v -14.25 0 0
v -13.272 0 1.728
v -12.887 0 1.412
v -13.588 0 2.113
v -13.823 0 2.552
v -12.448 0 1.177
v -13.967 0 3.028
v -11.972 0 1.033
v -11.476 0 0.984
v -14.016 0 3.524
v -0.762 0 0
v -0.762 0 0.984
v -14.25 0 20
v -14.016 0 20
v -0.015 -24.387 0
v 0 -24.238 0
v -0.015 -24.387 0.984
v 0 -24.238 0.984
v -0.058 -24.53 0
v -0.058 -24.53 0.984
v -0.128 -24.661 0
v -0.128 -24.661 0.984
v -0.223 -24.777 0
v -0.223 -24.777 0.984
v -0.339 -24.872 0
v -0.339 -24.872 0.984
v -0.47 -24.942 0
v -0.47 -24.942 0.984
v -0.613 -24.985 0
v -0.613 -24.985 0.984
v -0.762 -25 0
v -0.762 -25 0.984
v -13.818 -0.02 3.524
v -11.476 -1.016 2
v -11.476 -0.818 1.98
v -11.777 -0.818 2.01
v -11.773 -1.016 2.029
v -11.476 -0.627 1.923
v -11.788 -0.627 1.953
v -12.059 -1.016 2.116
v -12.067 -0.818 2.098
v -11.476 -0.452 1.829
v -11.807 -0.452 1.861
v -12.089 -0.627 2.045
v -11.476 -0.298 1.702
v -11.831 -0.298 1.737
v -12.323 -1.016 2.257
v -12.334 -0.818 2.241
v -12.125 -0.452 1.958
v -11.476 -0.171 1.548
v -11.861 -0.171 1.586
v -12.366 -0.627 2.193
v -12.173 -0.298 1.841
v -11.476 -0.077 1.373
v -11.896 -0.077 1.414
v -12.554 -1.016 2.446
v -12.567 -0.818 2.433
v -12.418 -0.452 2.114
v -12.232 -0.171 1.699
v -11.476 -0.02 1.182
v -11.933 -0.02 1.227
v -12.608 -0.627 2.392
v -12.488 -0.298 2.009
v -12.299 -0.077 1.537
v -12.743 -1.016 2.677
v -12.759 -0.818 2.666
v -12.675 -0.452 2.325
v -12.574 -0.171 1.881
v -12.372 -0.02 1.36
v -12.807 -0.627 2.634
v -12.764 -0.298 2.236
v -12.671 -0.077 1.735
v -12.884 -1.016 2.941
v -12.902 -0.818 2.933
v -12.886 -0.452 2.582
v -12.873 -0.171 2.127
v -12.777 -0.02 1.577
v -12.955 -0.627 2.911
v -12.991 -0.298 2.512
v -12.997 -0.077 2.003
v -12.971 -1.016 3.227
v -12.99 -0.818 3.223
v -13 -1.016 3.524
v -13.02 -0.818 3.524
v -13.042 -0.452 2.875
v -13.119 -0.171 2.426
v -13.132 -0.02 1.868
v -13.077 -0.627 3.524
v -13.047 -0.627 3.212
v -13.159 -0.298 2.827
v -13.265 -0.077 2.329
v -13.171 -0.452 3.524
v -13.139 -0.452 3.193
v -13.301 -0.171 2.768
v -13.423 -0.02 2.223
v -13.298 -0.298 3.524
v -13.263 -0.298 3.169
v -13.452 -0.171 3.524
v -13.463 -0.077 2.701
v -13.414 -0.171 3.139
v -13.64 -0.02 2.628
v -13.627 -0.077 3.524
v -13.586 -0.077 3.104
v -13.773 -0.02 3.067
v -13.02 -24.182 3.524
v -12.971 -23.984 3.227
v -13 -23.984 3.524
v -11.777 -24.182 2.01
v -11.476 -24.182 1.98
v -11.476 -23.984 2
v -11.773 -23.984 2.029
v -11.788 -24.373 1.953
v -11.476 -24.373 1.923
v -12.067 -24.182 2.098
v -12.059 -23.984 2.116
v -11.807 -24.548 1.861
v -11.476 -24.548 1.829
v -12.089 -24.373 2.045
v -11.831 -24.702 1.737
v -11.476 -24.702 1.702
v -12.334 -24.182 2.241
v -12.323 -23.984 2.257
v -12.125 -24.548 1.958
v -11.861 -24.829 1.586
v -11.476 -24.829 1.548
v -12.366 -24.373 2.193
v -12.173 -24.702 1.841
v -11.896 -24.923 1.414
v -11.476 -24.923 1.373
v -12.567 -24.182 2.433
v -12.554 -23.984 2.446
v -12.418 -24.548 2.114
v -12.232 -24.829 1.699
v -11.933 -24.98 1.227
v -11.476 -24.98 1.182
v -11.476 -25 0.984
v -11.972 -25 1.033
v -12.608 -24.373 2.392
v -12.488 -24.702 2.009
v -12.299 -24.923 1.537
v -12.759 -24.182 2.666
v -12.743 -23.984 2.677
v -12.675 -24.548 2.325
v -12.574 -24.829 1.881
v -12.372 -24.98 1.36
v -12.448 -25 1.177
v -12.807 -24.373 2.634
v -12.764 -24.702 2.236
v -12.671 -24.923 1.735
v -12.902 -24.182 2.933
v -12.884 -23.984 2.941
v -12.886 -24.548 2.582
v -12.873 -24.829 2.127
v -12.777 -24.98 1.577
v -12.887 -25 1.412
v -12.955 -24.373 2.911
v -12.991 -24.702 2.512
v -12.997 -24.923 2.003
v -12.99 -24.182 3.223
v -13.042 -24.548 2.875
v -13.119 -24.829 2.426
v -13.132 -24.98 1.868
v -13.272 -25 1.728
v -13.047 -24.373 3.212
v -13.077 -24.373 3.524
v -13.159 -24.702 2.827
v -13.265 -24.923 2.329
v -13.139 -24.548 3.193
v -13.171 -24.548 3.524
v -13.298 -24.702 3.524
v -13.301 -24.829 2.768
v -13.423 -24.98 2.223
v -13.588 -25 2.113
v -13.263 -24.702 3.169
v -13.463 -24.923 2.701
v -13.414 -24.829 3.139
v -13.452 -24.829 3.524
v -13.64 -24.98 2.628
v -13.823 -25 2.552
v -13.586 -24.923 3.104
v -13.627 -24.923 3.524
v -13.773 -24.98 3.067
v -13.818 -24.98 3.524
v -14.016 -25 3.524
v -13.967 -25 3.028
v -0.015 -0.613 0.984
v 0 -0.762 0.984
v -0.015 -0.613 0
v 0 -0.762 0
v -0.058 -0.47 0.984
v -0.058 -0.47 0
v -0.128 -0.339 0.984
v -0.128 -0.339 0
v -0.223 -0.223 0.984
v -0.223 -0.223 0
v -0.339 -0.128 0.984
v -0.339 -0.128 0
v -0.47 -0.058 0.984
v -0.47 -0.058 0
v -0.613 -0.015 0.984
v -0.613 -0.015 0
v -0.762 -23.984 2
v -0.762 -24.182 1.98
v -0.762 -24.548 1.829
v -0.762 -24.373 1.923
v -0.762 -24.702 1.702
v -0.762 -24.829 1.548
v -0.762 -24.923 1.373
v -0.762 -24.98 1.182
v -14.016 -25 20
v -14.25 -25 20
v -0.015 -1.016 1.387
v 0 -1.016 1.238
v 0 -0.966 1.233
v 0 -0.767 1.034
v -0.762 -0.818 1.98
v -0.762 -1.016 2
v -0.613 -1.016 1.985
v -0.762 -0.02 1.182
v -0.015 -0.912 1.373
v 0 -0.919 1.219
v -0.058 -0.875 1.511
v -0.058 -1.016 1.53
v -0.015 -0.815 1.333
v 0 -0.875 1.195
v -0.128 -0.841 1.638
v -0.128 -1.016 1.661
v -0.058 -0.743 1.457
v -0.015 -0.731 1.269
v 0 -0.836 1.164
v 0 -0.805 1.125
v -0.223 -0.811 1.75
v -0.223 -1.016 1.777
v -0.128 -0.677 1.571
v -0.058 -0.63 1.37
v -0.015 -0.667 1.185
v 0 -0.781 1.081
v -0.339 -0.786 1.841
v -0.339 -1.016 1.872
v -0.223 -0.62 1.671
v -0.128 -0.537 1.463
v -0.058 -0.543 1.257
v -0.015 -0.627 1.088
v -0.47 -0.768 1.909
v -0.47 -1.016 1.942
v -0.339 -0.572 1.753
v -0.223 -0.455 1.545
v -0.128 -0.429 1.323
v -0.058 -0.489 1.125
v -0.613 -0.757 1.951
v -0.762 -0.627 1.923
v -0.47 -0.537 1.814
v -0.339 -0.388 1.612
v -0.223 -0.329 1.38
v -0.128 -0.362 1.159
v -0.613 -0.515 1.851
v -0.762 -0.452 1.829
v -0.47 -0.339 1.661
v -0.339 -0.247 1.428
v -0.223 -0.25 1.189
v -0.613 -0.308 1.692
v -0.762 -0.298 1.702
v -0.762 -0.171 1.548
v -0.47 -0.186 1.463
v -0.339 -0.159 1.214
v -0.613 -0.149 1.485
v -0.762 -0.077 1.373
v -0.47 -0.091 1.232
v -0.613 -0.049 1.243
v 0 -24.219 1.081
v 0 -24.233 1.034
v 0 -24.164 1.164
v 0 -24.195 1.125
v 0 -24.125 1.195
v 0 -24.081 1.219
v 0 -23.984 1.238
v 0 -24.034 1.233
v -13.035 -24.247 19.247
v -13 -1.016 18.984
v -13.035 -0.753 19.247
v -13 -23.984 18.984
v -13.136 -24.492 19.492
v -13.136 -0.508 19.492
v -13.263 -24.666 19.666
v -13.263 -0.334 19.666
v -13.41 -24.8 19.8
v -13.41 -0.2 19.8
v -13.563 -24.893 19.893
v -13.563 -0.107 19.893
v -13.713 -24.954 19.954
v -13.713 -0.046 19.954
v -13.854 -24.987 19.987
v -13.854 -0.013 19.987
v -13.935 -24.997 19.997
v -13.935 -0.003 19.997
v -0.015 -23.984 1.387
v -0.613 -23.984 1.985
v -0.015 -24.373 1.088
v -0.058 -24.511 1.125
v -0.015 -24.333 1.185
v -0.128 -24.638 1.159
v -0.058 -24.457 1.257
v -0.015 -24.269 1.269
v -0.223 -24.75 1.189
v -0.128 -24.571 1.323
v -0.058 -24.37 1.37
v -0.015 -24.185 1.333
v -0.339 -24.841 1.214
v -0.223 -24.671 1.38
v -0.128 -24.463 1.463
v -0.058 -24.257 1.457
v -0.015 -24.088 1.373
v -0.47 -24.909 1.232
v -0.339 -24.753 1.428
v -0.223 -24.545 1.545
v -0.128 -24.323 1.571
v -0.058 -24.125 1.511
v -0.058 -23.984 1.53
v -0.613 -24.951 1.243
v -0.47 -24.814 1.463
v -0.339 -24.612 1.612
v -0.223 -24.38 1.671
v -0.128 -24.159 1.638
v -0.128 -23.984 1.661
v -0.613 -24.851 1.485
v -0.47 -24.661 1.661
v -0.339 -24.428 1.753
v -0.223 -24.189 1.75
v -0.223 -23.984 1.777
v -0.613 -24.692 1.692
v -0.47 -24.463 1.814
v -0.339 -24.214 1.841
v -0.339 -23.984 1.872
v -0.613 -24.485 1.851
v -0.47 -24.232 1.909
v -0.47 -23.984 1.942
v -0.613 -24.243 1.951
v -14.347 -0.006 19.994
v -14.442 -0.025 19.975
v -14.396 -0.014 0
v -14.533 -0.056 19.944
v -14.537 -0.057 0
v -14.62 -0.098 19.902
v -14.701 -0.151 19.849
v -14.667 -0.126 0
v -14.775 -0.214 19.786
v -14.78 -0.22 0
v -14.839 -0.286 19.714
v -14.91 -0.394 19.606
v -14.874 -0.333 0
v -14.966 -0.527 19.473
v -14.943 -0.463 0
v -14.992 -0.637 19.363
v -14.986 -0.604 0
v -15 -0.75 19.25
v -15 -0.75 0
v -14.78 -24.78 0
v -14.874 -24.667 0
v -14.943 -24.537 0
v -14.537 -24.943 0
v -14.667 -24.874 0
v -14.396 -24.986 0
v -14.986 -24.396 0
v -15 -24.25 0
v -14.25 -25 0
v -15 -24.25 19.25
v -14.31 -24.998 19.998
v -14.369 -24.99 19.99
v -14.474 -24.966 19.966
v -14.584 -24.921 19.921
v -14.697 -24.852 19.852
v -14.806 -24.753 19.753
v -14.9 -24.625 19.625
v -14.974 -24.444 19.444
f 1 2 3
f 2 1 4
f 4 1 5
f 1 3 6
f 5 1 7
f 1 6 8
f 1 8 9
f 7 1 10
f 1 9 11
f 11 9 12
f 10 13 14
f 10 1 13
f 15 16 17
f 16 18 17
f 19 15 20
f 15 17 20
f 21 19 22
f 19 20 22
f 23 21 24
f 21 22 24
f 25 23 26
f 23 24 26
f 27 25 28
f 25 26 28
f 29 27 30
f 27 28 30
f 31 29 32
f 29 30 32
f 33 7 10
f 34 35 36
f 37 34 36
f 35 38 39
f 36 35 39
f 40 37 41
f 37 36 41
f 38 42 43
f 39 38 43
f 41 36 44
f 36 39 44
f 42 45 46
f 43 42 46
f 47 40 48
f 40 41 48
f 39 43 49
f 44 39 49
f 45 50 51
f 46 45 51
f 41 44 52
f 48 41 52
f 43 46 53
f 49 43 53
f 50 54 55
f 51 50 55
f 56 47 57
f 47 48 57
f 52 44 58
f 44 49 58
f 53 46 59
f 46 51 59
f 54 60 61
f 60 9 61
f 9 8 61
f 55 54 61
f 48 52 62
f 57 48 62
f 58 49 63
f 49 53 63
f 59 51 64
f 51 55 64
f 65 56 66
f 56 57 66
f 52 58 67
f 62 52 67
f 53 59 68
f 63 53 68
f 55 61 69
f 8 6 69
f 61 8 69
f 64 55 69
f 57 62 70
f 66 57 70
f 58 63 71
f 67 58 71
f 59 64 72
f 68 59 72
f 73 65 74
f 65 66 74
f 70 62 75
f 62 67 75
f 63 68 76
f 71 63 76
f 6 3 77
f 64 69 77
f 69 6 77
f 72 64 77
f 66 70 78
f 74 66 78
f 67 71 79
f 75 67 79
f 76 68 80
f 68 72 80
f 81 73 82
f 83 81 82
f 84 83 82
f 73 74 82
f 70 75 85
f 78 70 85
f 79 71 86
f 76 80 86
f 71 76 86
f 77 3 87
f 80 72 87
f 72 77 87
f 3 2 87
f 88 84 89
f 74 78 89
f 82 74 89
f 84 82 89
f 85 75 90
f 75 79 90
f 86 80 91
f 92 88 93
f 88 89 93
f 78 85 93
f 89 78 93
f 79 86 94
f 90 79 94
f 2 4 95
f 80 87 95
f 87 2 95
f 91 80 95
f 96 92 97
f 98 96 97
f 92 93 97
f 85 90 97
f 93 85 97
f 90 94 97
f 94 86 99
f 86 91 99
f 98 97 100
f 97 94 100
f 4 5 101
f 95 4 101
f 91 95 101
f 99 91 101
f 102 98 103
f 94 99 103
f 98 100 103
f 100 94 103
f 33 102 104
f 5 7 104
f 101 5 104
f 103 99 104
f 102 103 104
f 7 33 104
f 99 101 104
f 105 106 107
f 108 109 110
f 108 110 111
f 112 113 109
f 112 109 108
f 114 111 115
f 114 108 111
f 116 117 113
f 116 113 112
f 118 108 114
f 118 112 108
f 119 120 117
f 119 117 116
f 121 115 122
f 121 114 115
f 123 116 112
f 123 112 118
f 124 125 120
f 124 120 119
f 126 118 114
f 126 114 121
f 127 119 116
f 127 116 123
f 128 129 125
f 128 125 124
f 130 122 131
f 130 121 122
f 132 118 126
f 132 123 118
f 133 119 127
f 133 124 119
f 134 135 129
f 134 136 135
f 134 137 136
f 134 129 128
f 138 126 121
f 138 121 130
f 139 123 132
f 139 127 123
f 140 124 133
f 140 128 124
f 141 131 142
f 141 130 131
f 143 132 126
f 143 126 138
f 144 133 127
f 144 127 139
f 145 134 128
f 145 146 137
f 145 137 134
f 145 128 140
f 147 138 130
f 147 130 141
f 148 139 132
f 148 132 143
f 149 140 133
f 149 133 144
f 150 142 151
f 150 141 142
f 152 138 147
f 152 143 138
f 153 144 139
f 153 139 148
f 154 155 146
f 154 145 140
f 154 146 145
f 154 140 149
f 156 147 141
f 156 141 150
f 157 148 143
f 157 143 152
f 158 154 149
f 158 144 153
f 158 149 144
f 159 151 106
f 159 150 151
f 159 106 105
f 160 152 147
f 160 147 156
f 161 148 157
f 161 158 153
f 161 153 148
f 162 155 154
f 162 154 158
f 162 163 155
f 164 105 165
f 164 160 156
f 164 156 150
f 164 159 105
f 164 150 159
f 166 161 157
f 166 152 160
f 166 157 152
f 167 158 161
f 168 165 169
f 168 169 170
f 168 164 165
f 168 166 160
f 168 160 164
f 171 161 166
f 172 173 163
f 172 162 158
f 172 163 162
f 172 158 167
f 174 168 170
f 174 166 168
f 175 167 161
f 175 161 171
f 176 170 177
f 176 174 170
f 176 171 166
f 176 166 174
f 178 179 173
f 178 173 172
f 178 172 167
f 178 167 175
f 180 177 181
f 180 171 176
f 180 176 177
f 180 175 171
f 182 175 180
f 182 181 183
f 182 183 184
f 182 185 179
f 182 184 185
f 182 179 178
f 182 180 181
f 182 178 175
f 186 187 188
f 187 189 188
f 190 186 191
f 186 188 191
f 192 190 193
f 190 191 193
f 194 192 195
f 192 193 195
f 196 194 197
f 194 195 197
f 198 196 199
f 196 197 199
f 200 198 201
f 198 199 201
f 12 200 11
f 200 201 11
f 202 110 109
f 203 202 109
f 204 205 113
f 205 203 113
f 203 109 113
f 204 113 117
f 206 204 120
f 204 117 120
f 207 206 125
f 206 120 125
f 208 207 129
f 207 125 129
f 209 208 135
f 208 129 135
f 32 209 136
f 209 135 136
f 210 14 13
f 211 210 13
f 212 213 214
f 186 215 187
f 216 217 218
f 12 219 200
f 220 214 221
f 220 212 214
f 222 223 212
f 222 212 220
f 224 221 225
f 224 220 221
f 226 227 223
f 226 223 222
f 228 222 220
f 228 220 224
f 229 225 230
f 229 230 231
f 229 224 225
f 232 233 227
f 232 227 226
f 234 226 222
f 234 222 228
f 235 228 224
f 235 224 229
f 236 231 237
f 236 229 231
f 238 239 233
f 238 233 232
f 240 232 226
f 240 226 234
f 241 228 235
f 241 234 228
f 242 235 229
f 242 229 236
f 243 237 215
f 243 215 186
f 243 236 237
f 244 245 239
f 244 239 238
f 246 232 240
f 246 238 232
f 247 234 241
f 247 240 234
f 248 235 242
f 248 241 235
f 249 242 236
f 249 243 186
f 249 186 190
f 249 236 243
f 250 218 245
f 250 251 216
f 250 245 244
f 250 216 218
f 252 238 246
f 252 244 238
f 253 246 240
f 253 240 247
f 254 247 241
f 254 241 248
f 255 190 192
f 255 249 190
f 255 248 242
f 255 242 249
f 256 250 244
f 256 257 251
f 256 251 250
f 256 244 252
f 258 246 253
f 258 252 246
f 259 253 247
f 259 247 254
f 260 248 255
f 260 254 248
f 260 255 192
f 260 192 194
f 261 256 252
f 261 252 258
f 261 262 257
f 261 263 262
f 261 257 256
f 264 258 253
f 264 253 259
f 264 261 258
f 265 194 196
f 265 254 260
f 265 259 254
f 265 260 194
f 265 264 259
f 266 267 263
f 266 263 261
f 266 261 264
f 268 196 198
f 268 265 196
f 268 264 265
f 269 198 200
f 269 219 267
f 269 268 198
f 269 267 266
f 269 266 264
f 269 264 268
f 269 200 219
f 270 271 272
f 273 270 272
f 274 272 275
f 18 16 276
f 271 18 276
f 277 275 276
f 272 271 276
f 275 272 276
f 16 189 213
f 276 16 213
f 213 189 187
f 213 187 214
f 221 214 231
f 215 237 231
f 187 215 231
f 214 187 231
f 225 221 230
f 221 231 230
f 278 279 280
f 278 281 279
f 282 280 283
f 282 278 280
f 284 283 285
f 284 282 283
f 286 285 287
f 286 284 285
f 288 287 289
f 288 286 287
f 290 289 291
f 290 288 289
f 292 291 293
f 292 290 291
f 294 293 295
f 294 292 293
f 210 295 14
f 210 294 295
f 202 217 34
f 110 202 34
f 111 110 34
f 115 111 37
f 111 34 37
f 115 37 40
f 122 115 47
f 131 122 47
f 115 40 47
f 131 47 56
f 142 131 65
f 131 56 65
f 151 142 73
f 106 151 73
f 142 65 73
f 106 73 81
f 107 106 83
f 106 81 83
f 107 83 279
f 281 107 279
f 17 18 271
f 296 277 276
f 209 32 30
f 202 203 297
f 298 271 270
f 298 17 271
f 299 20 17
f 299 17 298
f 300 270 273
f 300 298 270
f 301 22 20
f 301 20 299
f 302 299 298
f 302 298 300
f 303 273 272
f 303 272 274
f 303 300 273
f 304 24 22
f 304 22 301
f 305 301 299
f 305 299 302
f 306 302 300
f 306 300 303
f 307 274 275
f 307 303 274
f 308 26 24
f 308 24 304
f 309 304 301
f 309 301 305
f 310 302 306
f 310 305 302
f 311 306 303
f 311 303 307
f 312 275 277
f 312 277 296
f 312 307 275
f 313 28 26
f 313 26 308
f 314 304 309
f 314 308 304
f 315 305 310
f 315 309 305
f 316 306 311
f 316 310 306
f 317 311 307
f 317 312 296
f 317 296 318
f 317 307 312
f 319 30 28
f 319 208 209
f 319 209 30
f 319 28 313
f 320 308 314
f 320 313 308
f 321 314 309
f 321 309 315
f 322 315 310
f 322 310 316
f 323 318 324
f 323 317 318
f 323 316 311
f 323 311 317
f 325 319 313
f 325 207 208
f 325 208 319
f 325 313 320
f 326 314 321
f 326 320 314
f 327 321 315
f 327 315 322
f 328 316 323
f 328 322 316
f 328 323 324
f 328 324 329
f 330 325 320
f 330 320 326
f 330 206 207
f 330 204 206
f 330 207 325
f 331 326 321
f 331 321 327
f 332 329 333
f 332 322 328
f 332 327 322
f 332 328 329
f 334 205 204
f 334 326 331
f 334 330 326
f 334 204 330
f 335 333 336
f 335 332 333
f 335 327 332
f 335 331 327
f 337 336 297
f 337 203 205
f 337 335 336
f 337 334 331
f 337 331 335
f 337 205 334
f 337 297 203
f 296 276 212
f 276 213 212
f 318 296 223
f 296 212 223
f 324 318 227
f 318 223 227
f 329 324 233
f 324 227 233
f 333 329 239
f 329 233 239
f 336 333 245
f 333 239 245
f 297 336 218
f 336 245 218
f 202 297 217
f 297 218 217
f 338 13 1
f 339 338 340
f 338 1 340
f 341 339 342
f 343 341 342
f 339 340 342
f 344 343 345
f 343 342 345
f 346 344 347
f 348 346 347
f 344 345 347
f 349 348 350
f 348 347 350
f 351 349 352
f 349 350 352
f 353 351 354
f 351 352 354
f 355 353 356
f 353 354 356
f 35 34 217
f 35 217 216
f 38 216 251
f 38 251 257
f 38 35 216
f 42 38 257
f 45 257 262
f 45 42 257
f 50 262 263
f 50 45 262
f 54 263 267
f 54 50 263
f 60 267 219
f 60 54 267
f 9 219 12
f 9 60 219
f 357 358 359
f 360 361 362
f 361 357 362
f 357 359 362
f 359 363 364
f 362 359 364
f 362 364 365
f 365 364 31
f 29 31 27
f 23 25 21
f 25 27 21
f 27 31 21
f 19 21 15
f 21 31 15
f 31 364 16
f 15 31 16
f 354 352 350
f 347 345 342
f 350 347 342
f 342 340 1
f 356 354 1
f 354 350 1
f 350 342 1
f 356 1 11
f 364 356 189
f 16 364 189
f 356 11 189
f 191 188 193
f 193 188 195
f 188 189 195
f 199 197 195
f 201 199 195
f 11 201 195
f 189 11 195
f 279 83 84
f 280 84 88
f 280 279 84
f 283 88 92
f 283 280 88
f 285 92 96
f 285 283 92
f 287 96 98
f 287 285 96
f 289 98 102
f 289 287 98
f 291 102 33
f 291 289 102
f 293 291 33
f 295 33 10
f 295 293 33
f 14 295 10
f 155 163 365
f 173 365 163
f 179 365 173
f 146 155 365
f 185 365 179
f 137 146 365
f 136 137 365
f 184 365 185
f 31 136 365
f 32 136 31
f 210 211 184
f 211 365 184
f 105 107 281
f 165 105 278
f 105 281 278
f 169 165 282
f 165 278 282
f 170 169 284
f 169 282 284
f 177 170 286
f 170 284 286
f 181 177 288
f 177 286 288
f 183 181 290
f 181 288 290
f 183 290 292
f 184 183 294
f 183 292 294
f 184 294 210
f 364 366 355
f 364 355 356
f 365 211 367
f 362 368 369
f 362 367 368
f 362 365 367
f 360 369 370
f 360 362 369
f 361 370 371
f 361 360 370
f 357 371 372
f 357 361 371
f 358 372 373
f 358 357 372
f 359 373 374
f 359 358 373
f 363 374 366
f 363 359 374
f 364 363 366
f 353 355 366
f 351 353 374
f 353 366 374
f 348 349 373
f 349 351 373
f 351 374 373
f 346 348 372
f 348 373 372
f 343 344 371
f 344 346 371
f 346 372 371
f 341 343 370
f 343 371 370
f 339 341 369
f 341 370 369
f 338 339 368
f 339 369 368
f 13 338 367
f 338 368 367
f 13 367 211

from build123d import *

# Parameters (mm, degrees)
F1_DEPTH = 25
F2_R     = 1.016
F3_R     = 0.75
F4_R     = 0.762


with BuildPart() as f1:
    # F0 (on Front) → F1 (new body)
    with BuildSketch(Plane.XZ):
        with BuildLine():
            Line((-15, 0), (0, 0))
            Line((0, 0), (0, 2))
            Line((0, 2), (-11.476, 2))
            ThreePointArc((-11.476, 2), (-12.5536307345, 2.4463692655), (-13, 3.524))
            Line((-13, 3.524), (-13, 20))
            Line((-13, 20), (-15, 20))
            Line((-15, 20), (-15, 0))
        make_face()
    extrude(amount=F1_DEPTH)

    # F2
    f2_edges = [f1.edges().sort_by_distance(p)[0] for p in [
        (-13, -12.5, 3.524),
        (-13, -12.5, 20),
        (-13, 0, 11.762),
        (-13, -25, 11.762),
    ]]
    fillet(f2_edges, radius=F2_R)

    # F3
    f3_edges = [f1.edges().sort_by_distance(p)[0] for p in [
        (-15, 0, 10),
        (-15, -12.5, 20),
        (-15, -25, 10),
    ]]
    fillet(f3_edges, radius=F3_R)

    # F4
    f4_edges = [f1.edges().sort_by_distance(p)[0] for p in [
        (0, -25, 0.492),
        (0, -24.70242, 1.70242),
        (0, -12.5, 2),
        (0, -0.29758, 1.70242),
        (0, 0, 0.492),
    ]]
    fillet(f4_edges, radius=F4_R)


solid = f1.part
